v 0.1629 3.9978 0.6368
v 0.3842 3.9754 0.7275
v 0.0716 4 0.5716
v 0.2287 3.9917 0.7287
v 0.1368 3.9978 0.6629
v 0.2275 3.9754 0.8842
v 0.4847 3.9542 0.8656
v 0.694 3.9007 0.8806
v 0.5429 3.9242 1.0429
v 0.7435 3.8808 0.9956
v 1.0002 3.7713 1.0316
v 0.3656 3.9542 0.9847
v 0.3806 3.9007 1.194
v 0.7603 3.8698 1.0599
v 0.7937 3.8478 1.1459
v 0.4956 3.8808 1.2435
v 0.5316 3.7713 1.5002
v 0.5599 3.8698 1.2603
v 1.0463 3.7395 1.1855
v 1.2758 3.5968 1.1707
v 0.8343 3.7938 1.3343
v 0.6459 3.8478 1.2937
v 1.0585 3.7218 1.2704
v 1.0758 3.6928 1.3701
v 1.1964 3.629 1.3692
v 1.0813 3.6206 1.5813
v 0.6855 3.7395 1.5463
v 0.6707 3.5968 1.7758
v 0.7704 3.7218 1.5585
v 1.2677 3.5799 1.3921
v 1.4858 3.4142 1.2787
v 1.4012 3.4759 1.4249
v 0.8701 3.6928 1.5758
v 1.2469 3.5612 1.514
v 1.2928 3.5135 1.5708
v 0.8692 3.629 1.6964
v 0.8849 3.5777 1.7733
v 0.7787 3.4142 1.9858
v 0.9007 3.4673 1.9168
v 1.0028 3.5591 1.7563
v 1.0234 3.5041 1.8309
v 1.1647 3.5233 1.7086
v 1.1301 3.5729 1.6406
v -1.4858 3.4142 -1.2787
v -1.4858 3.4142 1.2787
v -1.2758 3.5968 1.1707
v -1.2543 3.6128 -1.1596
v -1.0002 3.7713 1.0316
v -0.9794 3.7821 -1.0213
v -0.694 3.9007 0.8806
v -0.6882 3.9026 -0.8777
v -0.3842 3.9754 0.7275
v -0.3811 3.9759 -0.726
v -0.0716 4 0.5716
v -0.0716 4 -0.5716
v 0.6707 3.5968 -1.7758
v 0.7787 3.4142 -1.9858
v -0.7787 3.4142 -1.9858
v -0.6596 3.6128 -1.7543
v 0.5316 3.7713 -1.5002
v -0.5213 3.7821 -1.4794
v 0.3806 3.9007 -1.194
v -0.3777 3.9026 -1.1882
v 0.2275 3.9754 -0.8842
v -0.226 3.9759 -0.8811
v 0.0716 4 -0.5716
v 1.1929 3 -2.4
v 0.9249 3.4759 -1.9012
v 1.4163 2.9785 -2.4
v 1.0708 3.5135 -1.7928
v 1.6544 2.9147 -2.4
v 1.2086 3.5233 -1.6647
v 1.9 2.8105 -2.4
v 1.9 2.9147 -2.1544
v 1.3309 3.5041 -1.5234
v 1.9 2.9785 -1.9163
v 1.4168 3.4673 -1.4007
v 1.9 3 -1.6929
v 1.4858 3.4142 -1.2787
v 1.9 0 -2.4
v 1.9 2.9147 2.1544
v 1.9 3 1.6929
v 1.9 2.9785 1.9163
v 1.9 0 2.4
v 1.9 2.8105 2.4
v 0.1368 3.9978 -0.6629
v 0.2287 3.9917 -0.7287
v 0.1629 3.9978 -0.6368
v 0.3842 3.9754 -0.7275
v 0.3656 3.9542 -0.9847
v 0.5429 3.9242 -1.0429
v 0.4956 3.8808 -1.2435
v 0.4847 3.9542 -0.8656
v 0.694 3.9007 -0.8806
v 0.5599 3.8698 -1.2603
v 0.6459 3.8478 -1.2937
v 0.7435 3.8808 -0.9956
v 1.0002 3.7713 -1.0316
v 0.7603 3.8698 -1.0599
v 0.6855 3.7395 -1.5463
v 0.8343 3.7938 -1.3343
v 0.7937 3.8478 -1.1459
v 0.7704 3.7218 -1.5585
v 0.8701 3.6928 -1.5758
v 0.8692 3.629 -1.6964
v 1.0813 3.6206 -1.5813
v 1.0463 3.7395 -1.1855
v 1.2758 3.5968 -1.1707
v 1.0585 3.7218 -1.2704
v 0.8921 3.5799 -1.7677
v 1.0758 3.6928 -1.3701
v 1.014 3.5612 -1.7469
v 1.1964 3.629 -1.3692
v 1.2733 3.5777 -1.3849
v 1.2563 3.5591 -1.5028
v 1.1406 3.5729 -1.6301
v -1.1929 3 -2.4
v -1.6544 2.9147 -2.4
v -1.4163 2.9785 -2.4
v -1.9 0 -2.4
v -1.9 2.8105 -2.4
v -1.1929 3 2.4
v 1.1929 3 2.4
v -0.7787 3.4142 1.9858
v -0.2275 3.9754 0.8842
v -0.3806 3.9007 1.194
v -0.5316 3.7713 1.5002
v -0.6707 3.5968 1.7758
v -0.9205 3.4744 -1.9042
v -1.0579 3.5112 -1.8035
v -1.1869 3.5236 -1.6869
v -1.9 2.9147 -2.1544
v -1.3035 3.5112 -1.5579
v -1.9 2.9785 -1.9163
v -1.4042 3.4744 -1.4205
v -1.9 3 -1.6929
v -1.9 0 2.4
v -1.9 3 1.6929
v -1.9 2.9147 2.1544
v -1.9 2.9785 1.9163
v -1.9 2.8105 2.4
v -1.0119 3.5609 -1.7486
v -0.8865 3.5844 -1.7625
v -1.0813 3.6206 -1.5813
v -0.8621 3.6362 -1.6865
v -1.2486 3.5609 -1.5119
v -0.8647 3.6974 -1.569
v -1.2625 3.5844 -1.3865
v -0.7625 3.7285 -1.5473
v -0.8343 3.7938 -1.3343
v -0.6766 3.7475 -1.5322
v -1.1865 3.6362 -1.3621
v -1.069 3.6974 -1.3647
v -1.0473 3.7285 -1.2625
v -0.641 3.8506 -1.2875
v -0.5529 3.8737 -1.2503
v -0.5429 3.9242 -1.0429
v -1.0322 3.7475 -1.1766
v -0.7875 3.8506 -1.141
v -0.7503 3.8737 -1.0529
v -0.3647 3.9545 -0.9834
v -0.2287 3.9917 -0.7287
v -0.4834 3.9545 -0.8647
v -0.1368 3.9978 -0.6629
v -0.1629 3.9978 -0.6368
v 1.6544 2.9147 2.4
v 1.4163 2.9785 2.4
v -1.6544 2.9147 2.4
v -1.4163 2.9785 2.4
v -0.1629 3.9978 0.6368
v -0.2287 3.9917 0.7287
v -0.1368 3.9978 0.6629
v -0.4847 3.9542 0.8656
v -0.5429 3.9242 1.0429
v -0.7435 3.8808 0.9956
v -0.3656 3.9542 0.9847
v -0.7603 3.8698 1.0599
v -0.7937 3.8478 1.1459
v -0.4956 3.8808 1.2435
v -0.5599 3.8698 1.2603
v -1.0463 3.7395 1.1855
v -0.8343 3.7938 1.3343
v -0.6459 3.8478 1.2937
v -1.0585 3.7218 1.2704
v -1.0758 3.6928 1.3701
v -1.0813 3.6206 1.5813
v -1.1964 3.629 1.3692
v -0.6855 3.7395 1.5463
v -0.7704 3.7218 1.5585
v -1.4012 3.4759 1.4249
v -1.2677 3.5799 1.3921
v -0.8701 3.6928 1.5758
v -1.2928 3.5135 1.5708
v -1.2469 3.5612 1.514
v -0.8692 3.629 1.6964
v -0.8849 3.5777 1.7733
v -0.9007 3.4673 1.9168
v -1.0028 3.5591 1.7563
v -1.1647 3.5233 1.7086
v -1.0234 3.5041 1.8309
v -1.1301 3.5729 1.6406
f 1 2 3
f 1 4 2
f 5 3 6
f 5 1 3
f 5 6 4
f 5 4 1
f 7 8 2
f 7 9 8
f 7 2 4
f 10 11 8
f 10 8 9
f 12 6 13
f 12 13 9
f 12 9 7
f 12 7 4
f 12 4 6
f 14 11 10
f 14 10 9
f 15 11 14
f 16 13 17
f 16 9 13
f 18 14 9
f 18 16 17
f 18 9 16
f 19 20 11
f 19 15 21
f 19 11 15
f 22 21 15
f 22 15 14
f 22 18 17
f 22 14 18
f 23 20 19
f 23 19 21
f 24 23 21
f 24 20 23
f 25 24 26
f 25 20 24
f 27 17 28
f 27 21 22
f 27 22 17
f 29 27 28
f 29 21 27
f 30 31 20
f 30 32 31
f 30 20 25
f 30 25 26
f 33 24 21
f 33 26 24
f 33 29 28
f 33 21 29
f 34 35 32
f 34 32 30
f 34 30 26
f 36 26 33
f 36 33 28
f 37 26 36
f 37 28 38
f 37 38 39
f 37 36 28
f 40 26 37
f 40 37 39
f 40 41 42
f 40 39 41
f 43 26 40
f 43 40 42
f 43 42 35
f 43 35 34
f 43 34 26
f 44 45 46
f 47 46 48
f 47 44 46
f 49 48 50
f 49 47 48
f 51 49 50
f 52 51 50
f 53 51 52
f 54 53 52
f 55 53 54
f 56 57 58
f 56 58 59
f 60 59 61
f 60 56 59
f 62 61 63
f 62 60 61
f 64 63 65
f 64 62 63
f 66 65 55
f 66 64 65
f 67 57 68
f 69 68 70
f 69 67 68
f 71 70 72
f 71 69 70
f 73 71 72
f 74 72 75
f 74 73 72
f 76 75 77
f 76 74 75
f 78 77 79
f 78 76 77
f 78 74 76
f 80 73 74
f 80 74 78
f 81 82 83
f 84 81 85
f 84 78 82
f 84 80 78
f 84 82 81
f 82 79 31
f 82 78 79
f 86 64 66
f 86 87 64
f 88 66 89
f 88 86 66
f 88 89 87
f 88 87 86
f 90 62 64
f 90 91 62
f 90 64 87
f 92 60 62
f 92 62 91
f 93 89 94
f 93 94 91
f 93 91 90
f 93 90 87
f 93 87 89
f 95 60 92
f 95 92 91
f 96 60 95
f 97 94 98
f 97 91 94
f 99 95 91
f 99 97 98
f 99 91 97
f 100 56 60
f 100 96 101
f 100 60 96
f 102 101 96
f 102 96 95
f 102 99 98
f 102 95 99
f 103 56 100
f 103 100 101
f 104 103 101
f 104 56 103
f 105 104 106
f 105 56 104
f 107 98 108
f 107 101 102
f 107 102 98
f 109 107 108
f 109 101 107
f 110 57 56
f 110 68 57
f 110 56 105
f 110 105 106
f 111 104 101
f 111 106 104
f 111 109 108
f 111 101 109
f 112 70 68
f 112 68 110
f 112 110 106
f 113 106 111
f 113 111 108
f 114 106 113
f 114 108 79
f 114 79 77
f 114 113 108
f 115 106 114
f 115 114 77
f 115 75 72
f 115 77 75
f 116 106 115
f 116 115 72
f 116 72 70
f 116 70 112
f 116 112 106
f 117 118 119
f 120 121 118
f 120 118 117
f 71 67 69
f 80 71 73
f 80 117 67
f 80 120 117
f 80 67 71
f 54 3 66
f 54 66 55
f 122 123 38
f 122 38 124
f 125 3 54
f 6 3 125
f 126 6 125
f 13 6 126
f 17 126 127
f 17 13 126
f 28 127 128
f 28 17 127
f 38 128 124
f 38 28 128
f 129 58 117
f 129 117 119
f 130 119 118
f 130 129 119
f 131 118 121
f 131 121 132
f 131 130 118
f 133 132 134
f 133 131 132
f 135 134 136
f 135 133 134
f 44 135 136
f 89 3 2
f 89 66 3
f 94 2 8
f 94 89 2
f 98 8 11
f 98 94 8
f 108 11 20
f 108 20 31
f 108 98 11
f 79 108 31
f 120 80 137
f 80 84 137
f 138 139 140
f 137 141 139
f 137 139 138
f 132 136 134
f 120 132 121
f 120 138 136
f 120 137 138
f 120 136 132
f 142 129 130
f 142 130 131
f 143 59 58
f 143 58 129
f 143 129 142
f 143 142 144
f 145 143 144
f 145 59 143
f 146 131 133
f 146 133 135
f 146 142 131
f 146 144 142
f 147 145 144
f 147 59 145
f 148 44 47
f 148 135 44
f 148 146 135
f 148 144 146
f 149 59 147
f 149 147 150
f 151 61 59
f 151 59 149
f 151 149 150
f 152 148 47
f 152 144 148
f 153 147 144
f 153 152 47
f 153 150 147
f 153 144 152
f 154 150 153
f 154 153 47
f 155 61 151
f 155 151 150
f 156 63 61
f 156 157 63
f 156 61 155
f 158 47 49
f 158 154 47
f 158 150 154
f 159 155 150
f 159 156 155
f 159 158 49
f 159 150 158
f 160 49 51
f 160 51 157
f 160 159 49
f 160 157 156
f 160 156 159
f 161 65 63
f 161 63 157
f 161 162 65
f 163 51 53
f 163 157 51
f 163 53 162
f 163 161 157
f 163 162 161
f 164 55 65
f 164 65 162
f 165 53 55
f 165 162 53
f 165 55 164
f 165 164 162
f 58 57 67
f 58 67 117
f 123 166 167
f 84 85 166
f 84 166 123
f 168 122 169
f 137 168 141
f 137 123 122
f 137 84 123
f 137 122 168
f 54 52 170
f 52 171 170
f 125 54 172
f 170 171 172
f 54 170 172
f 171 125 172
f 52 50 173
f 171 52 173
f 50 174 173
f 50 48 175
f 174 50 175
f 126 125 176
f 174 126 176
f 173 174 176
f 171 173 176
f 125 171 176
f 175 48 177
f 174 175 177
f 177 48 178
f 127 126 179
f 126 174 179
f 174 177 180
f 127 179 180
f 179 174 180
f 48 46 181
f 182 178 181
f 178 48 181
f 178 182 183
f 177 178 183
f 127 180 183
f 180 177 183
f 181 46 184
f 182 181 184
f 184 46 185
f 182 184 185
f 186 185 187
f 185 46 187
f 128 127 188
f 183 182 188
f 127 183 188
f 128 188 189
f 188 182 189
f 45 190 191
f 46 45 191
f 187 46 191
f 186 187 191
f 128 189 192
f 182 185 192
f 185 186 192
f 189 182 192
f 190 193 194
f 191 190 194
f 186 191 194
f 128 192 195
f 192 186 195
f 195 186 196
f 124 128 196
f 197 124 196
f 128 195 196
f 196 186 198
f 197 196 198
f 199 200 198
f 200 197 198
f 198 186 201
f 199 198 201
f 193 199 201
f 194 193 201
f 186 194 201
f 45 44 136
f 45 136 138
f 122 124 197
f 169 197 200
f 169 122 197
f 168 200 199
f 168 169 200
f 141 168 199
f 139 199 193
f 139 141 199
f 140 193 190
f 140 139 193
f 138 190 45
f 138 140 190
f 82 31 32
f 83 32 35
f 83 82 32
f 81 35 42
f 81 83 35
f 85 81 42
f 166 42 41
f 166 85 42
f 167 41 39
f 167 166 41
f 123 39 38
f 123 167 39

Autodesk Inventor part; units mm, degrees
ref_plane "YZ Plane" through (0, 0, 0) normal (1, 0, 0) x (0, 1, 0)
ref_plane "XZ Plane" through (0, 0, 0) normal (0, 1, 0) x (-1, 0, 0)
ref_plane "XY Plane" through (0, 0, 0) normal (0, 0, 1) x (1, 0, 0)
sketch "Эскиз1" plane through (0, 0, 0) normal (0, 1, 0) x (-1, 0, 0)
  line L0 (1.9, -2.4) -> (-1.9, -2.4)
  line L1 (-1.9, -2.4) -> (-1.9, 2.4)
  line L2 (-1.9, 2.4) -> (1.9, 2.4)
  line L3 (1.9, 2.4) -> (1.9, -2.4)
  line L4 (0, -2.4) -> (0, 2.4) construction
  line L5 (1.9, 0) -> (-1.9, 0) construction
  line L6 (0, -3.36) -> (0, 3.36) projected
  line L7 (2.66, 0) -> (-2.66, 0) projected
  point P0 (0, 0)
  dimension "d4" = 3.8
  dimension "d5" = 4.8
extrude "Выдавливание1" add sketch "Эскиз1" along normal blind 4
chamfer "Фаска1" distance 1 angle 45 4 edges at (1.9, 4, 0) (0, 4, 2.4) (-1.9, 4, 0) (0, 4, -2.4)
fillet "Сопряжение1" radius 2 4 edges at (0.9, 4, 0) (-0.9, 4, 0) (0, 4, 1.4) (0, 4, -1.4)
fillet "Сопряжение2" radius 1 12 edges at (0, 3.4142, -1.9858) (-1.4858, 3.4142, 0) (1.4858, 3.4142, 0) (0, 3.4142, 1.9858) (-1.6929, 3.2071, -2.1929) (-0.8369, 3.8478, -1.3369) (1.6929, 3.2071, -2.1929) (0.8369, 3.8478, -1.3369) (1.6929, 3.2071, 2.1929) (0.8369, 3.8478, 1.3369) (-1.6929, 3.2071, 2.1929) (-0.8369, 3.8478, 1.3369)
properties part number "LED2"
